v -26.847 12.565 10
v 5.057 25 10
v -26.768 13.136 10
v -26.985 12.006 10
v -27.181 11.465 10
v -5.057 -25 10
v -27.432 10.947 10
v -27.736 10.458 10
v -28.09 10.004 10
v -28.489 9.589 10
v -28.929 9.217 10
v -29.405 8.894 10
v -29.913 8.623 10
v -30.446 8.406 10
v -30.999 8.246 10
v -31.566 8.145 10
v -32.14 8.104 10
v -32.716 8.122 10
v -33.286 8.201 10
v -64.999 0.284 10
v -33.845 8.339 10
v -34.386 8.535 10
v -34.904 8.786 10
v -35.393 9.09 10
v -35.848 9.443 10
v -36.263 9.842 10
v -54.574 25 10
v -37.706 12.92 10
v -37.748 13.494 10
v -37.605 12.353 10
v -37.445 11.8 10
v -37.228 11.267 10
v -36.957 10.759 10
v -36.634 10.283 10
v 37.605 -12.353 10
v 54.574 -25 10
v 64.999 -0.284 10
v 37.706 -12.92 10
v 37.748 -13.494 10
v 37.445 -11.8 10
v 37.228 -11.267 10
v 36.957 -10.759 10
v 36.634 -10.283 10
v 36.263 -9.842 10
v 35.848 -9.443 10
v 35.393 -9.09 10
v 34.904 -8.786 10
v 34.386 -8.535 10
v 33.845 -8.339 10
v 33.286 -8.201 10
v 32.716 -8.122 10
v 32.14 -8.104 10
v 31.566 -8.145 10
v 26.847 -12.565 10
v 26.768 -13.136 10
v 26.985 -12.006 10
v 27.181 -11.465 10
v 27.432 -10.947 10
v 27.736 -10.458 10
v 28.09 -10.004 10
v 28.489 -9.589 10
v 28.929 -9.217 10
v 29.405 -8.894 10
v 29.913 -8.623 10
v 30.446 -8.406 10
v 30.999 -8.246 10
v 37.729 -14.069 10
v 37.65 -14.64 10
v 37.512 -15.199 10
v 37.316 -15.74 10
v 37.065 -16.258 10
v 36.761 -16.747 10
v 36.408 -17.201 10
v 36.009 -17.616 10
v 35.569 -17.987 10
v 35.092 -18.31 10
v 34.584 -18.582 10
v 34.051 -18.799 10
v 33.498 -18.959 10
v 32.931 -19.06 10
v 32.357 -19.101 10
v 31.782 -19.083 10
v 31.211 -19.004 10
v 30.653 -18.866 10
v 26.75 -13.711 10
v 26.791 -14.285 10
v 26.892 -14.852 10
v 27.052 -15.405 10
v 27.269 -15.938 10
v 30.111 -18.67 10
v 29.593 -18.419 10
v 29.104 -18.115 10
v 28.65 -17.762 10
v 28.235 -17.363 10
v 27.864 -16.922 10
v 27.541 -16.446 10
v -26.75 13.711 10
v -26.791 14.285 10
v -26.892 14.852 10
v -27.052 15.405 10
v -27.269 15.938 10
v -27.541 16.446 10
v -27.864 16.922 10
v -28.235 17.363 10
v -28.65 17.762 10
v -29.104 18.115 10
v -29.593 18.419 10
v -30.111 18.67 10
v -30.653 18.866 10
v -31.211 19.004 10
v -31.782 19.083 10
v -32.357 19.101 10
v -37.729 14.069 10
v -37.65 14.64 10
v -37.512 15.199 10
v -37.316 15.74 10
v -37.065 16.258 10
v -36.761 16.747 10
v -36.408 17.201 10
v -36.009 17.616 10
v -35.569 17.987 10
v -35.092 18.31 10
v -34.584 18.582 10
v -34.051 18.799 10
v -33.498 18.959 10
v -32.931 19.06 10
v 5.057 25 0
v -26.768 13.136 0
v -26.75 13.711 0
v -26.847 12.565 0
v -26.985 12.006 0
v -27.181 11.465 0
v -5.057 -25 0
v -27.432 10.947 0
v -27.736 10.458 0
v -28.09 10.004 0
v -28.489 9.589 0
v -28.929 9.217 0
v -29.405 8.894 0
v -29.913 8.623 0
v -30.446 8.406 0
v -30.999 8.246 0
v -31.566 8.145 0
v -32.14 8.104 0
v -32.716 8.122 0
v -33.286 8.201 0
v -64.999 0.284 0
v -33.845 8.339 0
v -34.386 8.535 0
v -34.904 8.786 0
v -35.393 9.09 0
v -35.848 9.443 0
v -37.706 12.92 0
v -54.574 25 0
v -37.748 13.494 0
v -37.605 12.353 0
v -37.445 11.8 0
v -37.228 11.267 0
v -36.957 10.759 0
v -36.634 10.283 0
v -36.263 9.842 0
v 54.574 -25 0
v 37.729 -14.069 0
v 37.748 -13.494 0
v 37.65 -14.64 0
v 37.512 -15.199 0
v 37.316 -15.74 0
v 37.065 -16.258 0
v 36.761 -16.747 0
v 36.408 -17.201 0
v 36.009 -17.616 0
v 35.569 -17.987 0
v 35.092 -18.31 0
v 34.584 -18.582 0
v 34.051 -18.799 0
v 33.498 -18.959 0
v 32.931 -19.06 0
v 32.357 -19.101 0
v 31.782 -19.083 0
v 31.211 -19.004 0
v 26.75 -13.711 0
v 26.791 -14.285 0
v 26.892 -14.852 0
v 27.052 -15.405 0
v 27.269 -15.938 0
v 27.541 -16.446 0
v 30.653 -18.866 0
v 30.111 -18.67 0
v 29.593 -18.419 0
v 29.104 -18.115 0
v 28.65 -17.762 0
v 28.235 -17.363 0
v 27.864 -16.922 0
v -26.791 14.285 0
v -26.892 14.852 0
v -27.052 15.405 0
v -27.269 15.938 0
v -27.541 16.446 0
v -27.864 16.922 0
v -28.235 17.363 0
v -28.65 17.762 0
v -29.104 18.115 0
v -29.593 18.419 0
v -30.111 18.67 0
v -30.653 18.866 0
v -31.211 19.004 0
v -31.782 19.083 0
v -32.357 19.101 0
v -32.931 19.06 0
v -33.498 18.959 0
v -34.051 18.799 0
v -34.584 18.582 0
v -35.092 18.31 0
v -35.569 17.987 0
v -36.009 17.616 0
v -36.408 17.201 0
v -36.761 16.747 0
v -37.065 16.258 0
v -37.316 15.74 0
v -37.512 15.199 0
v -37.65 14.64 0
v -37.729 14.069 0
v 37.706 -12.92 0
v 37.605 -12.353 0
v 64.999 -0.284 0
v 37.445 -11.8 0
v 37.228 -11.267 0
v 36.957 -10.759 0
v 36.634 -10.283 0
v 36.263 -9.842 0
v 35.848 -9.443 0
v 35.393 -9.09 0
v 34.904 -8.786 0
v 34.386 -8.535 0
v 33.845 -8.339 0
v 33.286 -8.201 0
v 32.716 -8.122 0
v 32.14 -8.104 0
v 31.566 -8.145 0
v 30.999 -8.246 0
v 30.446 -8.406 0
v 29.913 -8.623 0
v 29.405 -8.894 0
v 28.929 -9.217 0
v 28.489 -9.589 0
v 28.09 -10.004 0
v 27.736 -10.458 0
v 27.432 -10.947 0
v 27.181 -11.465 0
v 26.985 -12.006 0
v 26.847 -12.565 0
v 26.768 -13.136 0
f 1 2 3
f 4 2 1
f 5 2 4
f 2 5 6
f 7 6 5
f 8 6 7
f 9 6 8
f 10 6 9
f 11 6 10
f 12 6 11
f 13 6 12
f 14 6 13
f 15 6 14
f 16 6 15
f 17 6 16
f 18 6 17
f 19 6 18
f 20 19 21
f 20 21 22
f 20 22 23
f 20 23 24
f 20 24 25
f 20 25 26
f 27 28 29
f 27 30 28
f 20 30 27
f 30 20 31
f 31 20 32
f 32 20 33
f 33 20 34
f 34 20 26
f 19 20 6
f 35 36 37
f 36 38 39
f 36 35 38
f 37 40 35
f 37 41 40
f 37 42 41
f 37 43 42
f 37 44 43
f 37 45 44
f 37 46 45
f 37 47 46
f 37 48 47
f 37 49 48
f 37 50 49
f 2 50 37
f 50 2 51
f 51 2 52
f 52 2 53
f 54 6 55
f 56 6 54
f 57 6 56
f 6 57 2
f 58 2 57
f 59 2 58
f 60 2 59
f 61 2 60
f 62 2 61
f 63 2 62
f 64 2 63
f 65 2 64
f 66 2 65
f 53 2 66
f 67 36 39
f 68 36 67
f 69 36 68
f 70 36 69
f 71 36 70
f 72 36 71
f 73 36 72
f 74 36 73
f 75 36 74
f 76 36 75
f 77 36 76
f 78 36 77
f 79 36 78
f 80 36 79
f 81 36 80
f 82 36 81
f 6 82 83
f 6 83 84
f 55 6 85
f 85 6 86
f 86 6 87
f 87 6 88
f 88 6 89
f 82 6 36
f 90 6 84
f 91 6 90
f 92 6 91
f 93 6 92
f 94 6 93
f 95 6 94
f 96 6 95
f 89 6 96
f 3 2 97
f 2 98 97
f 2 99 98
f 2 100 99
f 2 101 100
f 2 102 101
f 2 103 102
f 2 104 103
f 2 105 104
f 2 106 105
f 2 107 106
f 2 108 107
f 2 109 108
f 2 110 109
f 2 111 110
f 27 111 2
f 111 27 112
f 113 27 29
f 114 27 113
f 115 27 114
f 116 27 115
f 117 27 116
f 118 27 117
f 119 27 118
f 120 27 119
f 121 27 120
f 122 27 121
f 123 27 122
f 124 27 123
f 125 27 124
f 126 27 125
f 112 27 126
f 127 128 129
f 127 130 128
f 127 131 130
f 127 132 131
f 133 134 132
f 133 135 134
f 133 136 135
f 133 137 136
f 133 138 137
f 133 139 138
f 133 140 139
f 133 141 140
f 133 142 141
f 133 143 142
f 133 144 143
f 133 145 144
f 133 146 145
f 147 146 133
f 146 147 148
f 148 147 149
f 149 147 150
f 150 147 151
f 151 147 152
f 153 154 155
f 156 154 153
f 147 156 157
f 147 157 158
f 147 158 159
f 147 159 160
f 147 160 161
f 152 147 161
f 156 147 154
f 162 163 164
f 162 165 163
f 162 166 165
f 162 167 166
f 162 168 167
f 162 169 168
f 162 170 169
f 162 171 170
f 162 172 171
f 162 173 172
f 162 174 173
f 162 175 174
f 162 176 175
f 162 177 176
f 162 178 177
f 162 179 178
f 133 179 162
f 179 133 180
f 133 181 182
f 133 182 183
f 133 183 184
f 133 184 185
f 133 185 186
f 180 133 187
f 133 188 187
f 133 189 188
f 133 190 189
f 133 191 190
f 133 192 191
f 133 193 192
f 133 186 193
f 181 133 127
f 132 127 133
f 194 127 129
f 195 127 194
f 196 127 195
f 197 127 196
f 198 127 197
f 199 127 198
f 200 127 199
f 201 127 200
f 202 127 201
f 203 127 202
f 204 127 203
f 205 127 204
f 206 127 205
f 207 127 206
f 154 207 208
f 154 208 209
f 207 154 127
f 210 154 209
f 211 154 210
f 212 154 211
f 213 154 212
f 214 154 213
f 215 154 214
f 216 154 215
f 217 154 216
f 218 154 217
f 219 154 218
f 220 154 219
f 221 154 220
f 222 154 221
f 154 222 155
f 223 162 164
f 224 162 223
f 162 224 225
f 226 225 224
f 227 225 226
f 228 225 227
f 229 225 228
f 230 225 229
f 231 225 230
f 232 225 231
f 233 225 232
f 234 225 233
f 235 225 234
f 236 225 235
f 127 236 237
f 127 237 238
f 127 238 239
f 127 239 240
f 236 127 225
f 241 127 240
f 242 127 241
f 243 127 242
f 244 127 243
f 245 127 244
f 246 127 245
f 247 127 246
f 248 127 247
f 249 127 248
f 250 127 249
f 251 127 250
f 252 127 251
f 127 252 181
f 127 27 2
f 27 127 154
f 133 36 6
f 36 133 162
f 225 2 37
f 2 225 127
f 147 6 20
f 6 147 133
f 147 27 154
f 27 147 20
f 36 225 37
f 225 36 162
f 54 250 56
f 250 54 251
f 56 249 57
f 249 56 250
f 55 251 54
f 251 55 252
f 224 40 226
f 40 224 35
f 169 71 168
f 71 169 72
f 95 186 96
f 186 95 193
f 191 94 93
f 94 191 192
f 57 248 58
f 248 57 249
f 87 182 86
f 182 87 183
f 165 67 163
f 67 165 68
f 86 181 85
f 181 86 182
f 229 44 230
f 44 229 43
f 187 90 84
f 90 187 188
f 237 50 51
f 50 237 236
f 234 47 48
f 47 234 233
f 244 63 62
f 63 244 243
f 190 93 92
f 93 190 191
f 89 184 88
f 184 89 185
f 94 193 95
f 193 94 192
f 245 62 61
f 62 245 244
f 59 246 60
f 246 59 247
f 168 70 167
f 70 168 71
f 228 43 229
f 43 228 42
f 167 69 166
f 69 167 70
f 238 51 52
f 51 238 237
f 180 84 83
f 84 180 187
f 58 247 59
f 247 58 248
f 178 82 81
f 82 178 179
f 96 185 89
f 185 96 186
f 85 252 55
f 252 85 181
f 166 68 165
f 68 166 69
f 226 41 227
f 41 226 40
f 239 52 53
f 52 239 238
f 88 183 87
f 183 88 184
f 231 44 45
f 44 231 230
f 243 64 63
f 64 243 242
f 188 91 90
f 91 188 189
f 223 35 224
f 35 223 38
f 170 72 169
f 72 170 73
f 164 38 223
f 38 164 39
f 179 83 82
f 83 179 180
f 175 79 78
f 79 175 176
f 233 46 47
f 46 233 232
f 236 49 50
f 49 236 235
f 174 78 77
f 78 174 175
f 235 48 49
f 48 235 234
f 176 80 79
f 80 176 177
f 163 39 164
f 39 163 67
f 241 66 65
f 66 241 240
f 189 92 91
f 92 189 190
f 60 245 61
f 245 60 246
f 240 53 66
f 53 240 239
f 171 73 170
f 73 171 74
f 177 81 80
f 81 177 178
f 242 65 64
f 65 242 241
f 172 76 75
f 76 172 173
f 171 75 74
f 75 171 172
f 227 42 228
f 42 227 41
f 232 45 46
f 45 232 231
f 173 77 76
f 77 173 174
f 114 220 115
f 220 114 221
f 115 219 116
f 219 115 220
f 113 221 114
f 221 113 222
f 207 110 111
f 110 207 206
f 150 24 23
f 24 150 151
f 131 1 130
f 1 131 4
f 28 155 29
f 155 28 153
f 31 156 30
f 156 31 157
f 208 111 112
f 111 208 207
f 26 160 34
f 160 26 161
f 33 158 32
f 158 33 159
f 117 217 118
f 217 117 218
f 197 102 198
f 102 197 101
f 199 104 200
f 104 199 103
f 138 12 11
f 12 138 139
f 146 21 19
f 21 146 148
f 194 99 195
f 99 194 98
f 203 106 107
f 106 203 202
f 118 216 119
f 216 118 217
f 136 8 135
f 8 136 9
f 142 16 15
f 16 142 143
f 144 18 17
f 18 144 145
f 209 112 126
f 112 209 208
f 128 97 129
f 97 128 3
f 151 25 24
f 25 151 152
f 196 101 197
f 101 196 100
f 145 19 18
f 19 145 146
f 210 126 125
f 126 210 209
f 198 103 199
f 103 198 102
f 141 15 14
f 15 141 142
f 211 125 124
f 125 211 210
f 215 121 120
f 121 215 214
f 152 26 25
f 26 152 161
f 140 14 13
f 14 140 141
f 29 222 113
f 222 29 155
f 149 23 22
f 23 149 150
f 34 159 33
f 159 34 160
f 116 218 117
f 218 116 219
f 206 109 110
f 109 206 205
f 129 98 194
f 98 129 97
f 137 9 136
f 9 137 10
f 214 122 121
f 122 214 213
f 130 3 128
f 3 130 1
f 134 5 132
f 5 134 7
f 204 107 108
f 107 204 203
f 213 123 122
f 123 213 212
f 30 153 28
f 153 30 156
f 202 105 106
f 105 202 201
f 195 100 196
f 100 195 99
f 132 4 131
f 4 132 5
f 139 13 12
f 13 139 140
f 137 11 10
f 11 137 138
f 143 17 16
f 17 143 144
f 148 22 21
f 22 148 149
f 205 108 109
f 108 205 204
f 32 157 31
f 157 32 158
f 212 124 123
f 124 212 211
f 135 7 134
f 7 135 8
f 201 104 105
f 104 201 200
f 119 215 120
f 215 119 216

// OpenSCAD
/*
 * Offroad Adventure Trailer - Drawbar Wedge/Spacer Plate
 *
 * 10 mm 6082-T6 aluminum, CNC milled. Fills the plate_t gap between the
 * top of a V-drawbar arm and the underside of the beam it bolts to
 * (side rail or front crossbeam), and spreads the clamping load over
 * the angled lap joint.
 *
 * Shape = the plan-view intersection of the two 50 mm wide tubes:
 * a parallelogram. Two M10 through-bolts along the arm centerline
 * (with internal crush sleeves in both tubes, as everywhere else).
 */

$fn = 60;

module drawbar_wedge_plate(
    tube_w = 50,        // Width of both crossing VKR profiles
    plate_t = 10,       // Plate thickness = gap between arm and beam
    angle = 157.13,     // Angle of the arm relative to the beam (deg).
                        // Default matches frame.scad: atan2(675, -1600).
    hole_dia = 11,      // M10, drilled before galvanizing, reamed after
    hole_spacing = 70,  // Bolt spacing along the arm centerline
    max_len = 120       // Trim the parallelogram's needle tips (millable part)
) {
    difference() {
        // Parallelogram: beam strip (along X) intersected with arm strip,
        // tips trimmed to max_len along the arm direction
        intersection() {
            translate([-300, -tube_w/2, 0])
                cube([600, tube_w, plate_t]);
            rotate([0, 0, angle])
                translate([-300, -tube_w/2, 0])
                    cube([600, tube_w, plate_t]);
            rotate([0, 0, angle])
                translate([-max_len/2, -tube_w - 20, 0])
                    cube([max_len, 2*tube_w + 40, plate_t]);
        }

        // Two bolt holes along the arm centerline
        for (s = [-1, 1])
            rotate([0, 0, angle])
                translate([s * hole_spacing/2, 0, -1])
                    cylinder(d=hole_dia, h=plate_t + 2);
    }
}

// Renders if the file is opened standalone
drawbar_wedge_plate();
